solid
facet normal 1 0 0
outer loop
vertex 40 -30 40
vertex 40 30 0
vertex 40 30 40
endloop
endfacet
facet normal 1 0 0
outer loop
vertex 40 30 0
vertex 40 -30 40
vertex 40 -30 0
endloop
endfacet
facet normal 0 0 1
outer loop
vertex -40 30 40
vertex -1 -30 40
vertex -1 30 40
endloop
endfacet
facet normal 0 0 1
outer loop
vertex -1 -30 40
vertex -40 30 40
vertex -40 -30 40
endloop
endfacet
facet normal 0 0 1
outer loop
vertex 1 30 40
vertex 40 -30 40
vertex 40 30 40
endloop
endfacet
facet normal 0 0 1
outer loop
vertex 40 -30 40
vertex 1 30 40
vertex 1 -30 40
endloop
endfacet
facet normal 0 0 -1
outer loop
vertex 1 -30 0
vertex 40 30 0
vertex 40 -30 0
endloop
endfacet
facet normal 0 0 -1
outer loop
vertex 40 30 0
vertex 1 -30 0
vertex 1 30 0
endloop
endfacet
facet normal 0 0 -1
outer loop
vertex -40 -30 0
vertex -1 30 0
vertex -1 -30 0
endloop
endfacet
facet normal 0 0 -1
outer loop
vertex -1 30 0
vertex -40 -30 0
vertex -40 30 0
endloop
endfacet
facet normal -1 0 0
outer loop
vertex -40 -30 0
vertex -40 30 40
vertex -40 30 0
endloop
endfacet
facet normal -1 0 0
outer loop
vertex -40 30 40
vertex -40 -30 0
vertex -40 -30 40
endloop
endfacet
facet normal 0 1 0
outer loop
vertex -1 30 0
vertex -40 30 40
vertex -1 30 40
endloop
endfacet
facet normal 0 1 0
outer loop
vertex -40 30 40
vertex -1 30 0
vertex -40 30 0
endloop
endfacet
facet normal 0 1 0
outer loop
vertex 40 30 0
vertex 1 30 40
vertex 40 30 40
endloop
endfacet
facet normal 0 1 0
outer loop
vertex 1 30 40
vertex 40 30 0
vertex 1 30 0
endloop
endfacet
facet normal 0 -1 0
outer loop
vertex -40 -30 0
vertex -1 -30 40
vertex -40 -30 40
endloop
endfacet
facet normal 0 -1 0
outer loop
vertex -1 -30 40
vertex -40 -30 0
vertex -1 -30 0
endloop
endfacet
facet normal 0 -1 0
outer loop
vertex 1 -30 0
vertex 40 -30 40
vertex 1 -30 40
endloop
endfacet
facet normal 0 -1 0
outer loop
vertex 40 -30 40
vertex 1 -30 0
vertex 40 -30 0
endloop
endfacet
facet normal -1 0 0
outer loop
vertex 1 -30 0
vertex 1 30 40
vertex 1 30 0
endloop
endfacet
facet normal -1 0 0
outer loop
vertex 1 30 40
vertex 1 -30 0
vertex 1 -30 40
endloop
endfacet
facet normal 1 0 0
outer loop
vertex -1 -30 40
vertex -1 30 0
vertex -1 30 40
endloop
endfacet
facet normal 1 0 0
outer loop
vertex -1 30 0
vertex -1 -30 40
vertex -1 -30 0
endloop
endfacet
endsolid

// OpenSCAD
// Two-part box enclosure for a small electronics board (e.g. an Arduino-based temperature logger),
// printed as one piece with a part between them. NOVEL general part.
//

box_x   = 70;
box_y   = 50;
box_z   = 30;
wall    = 2;
floor   = 2;

lip_t   = 1.5;
lip_h   = 4;
clearance = 0.2;

$fn = 48;

part_size_x = box_x + 10;
part_size_y = box_y + 10;
part_size_z = box_z + 10;

difference() {
    translate([-part_size_x / 2, -part_size_y / 2, 0]) cube([part_size_x, part_size_y, part_size_z]);
    // A vertical plane through the centre, 1 mm thick, splitting the part into two solid blocks
    translate([-1, -part_size_y / 2, 0]) cube([2, part_size_y + 2, part_size_z]);
}
